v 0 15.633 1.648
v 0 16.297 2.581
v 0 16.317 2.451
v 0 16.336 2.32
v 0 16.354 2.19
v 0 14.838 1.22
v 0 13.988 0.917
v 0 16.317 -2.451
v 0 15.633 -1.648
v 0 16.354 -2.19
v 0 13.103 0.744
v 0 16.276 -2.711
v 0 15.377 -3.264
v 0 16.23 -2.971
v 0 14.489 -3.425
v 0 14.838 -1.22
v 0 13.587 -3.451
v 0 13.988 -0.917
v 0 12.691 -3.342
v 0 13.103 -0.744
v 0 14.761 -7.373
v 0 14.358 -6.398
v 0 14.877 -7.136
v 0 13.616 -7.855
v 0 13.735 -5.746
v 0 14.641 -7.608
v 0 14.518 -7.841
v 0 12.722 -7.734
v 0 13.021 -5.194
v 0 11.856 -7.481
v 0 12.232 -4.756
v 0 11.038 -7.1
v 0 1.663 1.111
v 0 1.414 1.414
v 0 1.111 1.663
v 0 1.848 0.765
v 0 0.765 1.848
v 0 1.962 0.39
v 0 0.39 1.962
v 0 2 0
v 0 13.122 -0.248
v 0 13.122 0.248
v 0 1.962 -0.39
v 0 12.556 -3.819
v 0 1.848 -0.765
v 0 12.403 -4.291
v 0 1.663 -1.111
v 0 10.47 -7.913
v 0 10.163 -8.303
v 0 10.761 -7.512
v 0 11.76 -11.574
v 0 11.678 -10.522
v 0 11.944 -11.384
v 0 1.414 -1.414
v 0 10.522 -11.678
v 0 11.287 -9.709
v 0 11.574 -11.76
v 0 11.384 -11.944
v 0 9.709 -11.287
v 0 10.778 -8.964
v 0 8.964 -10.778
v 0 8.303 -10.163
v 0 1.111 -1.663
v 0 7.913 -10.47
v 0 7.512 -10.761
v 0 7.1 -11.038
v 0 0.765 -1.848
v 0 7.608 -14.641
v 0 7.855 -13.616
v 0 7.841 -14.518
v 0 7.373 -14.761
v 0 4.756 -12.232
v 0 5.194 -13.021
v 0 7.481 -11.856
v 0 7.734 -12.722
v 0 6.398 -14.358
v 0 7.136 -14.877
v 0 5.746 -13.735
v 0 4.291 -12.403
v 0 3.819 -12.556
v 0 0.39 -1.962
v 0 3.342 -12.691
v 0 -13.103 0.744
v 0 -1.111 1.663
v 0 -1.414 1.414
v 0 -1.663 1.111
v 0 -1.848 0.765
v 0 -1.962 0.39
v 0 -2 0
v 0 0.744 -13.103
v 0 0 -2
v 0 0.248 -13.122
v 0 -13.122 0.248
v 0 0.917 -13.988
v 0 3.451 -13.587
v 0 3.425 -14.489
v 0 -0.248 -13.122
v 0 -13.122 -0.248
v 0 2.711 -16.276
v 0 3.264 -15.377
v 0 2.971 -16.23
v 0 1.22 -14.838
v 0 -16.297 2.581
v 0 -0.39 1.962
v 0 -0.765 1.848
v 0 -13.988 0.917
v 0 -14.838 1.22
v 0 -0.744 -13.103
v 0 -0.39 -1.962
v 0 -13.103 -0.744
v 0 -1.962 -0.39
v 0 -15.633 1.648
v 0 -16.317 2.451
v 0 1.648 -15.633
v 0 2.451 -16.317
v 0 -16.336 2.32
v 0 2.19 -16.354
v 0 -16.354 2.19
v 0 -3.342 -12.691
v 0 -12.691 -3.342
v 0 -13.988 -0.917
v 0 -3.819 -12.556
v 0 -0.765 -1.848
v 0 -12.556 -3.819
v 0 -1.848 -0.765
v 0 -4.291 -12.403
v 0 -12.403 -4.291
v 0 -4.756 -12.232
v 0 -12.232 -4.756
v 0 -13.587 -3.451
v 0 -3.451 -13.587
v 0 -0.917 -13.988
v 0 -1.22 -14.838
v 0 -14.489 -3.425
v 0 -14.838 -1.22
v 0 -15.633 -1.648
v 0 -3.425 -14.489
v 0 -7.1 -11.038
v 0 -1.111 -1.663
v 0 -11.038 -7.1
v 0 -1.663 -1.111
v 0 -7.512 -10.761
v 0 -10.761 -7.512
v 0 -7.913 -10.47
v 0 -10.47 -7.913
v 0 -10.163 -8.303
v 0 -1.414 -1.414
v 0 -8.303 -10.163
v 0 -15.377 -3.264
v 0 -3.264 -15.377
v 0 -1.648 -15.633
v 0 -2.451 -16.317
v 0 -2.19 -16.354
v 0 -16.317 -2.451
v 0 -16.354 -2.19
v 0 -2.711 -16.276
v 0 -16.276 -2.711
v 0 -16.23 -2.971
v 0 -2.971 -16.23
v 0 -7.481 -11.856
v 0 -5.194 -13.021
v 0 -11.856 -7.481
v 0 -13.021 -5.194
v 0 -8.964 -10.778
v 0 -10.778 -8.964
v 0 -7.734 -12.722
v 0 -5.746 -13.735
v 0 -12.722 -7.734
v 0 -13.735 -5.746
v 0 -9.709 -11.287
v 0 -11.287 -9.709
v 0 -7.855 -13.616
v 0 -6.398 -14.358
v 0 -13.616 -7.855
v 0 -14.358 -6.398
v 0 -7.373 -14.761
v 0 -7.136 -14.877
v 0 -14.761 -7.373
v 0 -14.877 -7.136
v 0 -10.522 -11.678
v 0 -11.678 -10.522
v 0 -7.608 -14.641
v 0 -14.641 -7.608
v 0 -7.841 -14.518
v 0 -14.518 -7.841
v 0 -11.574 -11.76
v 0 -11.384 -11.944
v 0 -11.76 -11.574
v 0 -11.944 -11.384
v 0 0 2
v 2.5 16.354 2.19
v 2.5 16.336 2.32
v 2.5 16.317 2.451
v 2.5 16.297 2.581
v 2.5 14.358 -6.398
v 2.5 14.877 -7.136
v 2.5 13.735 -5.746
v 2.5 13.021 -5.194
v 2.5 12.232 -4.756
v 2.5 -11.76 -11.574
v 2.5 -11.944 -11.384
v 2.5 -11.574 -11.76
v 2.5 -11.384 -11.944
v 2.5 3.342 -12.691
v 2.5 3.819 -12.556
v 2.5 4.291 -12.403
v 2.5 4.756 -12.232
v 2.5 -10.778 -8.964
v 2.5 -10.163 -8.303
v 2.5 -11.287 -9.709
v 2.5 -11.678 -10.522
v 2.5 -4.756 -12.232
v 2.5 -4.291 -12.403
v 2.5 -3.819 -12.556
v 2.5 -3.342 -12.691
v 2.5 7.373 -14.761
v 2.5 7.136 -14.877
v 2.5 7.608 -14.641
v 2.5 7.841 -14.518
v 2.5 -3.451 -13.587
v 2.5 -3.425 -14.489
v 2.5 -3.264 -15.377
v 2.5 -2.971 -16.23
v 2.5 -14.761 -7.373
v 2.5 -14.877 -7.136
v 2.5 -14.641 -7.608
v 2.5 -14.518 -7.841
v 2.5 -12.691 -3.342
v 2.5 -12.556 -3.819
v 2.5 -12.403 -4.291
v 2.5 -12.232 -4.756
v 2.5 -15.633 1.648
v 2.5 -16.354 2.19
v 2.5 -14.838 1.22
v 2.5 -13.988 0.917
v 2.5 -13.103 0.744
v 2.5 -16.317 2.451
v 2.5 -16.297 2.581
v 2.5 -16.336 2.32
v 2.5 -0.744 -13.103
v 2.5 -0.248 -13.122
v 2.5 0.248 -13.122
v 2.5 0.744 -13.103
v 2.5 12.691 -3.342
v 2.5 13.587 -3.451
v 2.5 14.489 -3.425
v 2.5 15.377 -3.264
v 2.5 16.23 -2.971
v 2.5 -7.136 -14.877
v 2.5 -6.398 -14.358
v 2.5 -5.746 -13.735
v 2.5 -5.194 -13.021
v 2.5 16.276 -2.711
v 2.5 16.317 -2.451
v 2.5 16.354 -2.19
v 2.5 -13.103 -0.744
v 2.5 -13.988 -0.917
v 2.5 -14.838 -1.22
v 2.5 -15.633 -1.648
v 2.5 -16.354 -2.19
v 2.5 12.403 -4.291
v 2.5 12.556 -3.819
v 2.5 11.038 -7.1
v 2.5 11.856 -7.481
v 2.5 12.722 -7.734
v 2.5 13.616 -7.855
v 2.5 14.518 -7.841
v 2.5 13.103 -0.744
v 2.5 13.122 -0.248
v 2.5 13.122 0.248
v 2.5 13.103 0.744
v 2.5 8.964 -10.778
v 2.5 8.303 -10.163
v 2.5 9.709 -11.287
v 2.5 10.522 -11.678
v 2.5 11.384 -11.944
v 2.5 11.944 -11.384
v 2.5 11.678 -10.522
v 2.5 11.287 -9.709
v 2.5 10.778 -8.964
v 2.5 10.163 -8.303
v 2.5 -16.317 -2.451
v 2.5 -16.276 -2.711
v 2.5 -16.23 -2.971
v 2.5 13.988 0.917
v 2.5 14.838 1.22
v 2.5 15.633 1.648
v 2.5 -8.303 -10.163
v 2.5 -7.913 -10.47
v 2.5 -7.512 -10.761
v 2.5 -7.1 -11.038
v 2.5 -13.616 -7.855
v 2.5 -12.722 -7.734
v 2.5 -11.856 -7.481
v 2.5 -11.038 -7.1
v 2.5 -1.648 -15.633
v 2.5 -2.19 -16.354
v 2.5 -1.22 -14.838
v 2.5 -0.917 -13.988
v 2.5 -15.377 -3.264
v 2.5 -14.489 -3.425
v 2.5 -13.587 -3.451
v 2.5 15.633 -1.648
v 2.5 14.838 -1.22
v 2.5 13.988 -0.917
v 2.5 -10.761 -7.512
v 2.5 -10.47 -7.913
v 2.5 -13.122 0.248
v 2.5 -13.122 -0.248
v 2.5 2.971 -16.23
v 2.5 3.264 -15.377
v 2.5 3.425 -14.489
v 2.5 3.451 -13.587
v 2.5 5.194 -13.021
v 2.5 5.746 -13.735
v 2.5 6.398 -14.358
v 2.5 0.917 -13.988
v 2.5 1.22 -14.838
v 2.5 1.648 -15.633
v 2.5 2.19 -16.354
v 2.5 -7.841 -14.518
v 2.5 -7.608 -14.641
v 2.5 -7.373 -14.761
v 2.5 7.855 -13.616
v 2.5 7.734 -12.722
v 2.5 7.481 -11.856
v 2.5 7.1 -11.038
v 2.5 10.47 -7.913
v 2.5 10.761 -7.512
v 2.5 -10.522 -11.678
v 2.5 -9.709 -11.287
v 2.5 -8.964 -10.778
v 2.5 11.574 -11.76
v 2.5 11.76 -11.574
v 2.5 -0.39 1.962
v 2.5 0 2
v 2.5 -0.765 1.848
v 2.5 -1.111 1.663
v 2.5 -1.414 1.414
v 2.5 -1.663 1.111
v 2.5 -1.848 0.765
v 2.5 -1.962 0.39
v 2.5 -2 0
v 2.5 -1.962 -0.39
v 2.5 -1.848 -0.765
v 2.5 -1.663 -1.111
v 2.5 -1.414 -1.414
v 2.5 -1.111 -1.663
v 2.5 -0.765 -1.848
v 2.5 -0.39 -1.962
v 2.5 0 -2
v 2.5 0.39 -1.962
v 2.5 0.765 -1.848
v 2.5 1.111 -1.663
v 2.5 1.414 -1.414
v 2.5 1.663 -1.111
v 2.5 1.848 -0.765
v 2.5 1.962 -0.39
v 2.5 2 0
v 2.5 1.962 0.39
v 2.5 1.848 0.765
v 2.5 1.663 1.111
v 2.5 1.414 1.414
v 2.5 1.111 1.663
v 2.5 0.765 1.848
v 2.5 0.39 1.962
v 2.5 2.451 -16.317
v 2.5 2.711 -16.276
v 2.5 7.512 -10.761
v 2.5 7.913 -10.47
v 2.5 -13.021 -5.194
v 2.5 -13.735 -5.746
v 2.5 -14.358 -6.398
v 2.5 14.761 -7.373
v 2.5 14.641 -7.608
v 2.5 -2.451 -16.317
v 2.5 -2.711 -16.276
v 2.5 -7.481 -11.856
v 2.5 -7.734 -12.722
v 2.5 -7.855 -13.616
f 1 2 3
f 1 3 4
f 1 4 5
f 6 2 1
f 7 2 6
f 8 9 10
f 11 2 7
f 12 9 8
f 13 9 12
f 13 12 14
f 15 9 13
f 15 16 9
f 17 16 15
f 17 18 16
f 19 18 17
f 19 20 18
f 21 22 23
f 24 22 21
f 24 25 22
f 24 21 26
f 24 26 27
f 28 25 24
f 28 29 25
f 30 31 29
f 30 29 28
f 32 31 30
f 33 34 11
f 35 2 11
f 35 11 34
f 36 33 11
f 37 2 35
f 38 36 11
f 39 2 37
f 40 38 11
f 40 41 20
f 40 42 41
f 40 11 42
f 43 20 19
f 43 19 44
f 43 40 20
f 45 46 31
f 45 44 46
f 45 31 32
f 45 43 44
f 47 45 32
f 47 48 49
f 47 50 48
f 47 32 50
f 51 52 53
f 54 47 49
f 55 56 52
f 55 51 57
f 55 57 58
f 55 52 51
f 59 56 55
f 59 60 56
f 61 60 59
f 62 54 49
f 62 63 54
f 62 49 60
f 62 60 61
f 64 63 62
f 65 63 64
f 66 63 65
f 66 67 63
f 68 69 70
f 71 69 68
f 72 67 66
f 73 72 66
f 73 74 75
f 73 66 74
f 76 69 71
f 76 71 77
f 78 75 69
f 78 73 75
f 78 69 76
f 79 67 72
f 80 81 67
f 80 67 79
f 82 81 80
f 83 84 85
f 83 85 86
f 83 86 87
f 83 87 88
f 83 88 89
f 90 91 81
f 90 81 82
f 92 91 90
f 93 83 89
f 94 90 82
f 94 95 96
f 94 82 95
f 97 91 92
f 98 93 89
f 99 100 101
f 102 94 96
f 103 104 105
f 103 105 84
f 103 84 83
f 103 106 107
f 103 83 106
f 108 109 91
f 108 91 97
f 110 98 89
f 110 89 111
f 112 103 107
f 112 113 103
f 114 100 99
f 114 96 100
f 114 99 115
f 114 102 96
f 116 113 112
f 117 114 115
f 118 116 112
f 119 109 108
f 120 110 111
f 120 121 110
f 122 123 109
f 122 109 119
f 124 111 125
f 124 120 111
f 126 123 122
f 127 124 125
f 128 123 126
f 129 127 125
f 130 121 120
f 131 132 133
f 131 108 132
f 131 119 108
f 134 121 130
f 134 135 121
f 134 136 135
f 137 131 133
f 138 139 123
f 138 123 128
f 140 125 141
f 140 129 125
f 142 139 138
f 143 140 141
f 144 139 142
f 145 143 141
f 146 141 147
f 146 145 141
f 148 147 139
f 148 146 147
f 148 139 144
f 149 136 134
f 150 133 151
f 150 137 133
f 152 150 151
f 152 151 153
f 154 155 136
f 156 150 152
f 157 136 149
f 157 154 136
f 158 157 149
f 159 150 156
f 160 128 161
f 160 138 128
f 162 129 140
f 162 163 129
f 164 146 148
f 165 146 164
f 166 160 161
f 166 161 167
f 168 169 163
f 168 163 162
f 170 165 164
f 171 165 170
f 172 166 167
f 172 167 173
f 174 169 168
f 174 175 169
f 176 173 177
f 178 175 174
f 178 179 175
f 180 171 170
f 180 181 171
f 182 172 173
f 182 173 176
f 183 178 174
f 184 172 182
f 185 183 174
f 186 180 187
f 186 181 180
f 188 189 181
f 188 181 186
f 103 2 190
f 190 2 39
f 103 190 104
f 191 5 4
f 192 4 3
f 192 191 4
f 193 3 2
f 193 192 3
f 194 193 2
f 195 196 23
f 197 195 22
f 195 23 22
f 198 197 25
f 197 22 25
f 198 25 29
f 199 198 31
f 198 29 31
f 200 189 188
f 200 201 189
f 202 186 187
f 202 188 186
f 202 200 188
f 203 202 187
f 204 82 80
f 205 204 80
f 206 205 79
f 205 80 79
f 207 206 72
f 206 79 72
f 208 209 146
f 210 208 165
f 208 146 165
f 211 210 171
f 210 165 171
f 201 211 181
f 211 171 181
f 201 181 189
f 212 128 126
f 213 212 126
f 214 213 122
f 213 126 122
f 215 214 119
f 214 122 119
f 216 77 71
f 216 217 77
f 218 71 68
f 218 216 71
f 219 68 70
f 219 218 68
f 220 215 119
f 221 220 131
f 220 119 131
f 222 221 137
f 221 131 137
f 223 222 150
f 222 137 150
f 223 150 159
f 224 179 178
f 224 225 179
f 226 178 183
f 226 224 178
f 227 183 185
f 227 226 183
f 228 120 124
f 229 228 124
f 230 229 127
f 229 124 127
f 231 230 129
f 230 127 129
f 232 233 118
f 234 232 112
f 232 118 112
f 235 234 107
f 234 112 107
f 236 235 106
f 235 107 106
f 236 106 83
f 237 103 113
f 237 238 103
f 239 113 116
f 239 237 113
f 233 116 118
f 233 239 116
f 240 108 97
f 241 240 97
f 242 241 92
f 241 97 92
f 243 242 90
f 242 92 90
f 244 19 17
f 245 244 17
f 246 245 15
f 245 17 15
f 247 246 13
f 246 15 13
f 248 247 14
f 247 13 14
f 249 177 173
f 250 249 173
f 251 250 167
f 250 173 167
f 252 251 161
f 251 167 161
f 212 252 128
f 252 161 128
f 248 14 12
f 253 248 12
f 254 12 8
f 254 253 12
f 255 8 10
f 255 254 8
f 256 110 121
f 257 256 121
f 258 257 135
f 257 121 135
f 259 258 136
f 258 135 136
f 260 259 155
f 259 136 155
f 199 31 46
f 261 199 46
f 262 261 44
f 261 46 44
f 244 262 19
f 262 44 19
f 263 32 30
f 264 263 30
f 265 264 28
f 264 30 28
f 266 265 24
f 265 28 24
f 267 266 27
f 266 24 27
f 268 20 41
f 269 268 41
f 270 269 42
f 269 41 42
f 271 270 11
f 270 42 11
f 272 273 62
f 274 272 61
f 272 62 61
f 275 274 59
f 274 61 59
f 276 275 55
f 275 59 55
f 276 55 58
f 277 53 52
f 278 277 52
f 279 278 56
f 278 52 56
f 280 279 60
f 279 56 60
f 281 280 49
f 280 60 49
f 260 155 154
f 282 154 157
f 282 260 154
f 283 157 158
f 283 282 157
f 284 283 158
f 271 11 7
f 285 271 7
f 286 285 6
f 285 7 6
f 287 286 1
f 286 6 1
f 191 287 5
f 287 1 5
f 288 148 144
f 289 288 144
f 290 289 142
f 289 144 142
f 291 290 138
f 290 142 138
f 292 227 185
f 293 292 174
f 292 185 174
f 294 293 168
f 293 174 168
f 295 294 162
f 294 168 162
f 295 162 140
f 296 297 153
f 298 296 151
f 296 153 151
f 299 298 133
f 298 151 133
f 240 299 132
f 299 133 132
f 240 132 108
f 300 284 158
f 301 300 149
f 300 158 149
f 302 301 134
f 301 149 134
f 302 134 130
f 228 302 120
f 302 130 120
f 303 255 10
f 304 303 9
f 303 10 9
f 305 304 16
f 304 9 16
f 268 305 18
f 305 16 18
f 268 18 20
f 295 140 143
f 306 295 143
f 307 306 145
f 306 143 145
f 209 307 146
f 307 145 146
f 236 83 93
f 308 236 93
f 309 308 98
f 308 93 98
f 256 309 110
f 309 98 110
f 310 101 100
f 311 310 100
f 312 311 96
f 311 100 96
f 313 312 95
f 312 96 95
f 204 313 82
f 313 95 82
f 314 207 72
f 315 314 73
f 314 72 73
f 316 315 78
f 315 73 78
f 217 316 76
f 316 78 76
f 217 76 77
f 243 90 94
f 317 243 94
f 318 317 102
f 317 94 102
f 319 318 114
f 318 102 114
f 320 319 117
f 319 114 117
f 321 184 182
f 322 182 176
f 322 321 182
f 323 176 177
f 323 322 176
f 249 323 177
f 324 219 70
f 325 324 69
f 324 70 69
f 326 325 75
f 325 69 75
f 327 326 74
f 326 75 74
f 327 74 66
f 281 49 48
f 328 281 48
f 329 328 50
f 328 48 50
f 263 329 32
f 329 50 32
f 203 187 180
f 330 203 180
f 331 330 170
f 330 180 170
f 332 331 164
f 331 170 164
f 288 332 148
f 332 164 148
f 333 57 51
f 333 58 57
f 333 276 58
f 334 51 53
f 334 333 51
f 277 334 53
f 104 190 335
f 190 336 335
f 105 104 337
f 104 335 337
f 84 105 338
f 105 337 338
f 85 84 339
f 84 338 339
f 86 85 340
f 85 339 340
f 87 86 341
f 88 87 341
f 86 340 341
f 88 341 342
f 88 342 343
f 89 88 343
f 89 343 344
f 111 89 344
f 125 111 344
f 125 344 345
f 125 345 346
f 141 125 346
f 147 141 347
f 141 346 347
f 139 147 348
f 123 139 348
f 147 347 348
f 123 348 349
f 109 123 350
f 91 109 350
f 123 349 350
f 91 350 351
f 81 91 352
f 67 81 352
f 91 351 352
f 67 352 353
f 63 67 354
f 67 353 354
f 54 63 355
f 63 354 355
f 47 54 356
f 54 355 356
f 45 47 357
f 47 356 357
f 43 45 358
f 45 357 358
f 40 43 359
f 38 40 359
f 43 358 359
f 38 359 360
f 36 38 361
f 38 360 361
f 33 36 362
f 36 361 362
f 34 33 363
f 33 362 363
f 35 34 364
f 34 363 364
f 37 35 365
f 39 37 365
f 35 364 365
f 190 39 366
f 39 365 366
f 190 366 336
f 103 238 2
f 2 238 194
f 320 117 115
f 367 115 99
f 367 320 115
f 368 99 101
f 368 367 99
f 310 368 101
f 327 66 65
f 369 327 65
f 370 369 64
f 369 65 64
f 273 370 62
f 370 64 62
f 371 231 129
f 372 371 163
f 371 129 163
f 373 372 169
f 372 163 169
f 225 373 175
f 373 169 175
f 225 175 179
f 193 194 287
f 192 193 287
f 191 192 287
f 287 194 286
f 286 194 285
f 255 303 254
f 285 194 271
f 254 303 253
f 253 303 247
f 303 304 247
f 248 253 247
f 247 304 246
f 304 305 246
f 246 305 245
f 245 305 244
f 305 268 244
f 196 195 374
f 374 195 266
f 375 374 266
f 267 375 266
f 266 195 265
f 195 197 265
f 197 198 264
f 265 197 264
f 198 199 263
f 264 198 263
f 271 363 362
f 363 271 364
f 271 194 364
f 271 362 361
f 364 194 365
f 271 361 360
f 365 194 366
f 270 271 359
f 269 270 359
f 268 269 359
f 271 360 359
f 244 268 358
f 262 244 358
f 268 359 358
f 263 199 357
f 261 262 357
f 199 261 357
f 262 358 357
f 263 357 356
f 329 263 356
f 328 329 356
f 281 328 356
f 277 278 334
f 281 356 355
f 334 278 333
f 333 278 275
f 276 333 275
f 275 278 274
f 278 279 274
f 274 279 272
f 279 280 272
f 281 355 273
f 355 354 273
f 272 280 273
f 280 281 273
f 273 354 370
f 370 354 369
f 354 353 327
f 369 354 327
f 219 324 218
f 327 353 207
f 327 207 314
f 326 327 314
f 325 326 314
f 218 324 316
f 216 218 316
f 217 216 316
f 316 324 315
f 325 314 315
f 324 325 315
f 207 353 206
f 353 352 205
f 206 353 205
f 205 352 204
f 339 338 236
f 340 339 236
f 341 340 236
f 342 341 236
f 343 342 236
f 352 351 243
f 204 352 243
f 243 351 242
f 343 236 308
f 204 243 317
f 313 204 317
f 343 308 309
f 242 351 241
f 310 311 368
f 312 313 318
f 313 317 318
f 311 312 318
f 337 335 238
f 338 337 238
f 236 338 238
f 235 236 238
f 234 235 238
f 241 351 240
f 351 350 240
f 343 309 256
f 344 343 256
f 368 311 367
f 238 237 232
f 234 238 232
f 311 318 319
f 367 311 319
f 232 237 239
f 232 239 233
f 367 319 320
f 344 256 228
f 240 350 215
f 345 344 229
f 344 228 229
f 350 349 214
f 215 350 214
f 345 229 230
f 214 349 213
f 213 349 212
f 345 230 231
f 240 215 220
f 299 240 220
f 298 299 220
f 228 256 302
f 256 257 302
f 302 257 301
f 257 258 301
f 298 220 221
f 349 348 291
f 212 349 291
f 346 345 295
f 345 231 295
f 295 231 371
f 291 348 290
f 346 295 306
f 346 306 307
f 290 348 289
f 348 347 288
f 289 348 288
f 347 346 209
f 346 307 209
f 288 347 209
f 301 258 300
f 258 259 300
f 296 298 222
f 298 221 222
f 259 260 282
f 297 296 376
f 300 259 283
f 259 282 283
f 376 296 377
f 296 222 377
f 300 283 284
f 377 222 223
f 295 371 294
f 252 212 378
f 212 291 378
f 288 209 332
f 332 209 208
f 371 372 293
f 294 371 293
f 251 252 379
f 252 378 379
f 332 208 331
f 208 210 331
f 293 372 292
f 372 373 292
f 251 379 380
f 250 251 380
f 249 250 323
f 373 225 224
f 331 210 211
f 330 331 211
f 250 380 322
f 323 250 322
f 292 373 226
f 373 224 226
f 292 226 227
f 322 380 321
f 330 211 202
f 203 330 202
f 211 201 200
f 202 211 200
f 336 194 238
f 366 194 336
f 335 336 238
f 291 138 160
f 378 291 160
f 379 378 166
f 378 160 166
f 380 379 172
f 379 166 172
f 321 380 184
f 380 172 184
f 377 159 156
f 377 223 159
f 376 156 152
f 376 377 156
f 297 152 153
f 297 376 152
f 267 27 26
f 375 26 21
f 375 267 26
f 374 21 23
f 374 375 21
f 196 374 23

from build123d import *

# Parameters (mm, degrees)
BASPROSKE_W        = 2.5
BASPROSKE_H        = 16.5
TOOTHCUT_DEPTH     = 24.468063405
TEETHCUTS_COUNT    = 20
TEETHCUTS_ANGLE    = 342
BORSKE_R           = 2
BORE_DEPTH         = 50.0000508
SKETCH1_W          = 14.029900708
SKETCH1_H          = 46.240429445
CUT_EXTRUDE1_DEPTH = 24.26283946


with BuildPart() as part:
    # BasProSke → Base-Revolve (revolve)
    with BuildSketch(Plane(origin=(0, 0, 0), x_dir=(1, 0, 0), z_dir=(0, 1, 0)), mode=Mode.PRIVATE) as base_revolve_sk:
        with Locations((1.25, 8.25)):
            Rectangle(BASPROSKE_W, BASPROSKE_H)
    revolve(base_revolve_sk.sketch.rotate(Axis((-10, 0, 0), (1, 0, 0)), 180), axis=Axis((-10, 0, 0), (1, 0, 0)))

    # TooCutSke → ToothCut (cut, through all)
    with BuildSketch(Plane(origin=(0, 0, 0), x_dir=(0, 0, -1), z_dir=(1, 0, 0))):
        with BuildLine():
            ThreePointArc((0.74381438, 13.102904875), (0, 13.124), (-0.74381438, 13.102904875))
            ThreePointArc((-0.74381438, 13.102904875), (-1.226473103, 14.852072512), (-2.209965745, 16.376962373))
            ThreePointArc((-2.209965745, 16.376962373), (0, 16.5254), (2.209965745, 16.376962373))
            ThreePointArc((2.209965745, 16.376962373), (1.226473103, 14.852072512), (0.74381438, 13.102904875))
        make_face()
    toothcut = extrude(amount=TOOTHCUT_DEPTH, mode=Mode.SUBTRACT)

    # TeethCuts: ToothCut ×20 about axis
    teethcuts_axis = Axis((-10, 0, 0), (1, 0, 0))
    for i in range(1, TEETHCUTS_COUNT):
        add(toothcut.rotate(teethcuts_axis, i * TEETHCUTS_ANGLE / (TEETHCUTS_COUNT - 1)), mode=Mode.SUBTRACT)

    # BorSke → Bore (cut, symmetric)
    with BuildSketch(Plane(origin=(0, 0, 0), x_dir=(0, 0, -1), z_dir=(1, 0, 0))):
        with Locations(Location((0, 0, 0), (0, 0, 180))):
            Circle(BORSKE_R)
    extrude(amount=BORE_DEPTH, both=True, mode=Mode.SUBTRACT)

    # Sketch1 → Cut-Extrude1 (cut, through all)
    with BuildSketch(Plane(origin=(2.5, 0, 0), x_dir=(0, 0, -1), z_dir=(1, 0, 0))):
        with Locations((-9.596119027, 6.823357103)):
            Rectangle(SKETCH1_W, SKETCH1_H)
    extrude(amount=-CUT_EXTRUDE1_DEPTH, mode=Mode.SUBTRACT)


solid = part.part
